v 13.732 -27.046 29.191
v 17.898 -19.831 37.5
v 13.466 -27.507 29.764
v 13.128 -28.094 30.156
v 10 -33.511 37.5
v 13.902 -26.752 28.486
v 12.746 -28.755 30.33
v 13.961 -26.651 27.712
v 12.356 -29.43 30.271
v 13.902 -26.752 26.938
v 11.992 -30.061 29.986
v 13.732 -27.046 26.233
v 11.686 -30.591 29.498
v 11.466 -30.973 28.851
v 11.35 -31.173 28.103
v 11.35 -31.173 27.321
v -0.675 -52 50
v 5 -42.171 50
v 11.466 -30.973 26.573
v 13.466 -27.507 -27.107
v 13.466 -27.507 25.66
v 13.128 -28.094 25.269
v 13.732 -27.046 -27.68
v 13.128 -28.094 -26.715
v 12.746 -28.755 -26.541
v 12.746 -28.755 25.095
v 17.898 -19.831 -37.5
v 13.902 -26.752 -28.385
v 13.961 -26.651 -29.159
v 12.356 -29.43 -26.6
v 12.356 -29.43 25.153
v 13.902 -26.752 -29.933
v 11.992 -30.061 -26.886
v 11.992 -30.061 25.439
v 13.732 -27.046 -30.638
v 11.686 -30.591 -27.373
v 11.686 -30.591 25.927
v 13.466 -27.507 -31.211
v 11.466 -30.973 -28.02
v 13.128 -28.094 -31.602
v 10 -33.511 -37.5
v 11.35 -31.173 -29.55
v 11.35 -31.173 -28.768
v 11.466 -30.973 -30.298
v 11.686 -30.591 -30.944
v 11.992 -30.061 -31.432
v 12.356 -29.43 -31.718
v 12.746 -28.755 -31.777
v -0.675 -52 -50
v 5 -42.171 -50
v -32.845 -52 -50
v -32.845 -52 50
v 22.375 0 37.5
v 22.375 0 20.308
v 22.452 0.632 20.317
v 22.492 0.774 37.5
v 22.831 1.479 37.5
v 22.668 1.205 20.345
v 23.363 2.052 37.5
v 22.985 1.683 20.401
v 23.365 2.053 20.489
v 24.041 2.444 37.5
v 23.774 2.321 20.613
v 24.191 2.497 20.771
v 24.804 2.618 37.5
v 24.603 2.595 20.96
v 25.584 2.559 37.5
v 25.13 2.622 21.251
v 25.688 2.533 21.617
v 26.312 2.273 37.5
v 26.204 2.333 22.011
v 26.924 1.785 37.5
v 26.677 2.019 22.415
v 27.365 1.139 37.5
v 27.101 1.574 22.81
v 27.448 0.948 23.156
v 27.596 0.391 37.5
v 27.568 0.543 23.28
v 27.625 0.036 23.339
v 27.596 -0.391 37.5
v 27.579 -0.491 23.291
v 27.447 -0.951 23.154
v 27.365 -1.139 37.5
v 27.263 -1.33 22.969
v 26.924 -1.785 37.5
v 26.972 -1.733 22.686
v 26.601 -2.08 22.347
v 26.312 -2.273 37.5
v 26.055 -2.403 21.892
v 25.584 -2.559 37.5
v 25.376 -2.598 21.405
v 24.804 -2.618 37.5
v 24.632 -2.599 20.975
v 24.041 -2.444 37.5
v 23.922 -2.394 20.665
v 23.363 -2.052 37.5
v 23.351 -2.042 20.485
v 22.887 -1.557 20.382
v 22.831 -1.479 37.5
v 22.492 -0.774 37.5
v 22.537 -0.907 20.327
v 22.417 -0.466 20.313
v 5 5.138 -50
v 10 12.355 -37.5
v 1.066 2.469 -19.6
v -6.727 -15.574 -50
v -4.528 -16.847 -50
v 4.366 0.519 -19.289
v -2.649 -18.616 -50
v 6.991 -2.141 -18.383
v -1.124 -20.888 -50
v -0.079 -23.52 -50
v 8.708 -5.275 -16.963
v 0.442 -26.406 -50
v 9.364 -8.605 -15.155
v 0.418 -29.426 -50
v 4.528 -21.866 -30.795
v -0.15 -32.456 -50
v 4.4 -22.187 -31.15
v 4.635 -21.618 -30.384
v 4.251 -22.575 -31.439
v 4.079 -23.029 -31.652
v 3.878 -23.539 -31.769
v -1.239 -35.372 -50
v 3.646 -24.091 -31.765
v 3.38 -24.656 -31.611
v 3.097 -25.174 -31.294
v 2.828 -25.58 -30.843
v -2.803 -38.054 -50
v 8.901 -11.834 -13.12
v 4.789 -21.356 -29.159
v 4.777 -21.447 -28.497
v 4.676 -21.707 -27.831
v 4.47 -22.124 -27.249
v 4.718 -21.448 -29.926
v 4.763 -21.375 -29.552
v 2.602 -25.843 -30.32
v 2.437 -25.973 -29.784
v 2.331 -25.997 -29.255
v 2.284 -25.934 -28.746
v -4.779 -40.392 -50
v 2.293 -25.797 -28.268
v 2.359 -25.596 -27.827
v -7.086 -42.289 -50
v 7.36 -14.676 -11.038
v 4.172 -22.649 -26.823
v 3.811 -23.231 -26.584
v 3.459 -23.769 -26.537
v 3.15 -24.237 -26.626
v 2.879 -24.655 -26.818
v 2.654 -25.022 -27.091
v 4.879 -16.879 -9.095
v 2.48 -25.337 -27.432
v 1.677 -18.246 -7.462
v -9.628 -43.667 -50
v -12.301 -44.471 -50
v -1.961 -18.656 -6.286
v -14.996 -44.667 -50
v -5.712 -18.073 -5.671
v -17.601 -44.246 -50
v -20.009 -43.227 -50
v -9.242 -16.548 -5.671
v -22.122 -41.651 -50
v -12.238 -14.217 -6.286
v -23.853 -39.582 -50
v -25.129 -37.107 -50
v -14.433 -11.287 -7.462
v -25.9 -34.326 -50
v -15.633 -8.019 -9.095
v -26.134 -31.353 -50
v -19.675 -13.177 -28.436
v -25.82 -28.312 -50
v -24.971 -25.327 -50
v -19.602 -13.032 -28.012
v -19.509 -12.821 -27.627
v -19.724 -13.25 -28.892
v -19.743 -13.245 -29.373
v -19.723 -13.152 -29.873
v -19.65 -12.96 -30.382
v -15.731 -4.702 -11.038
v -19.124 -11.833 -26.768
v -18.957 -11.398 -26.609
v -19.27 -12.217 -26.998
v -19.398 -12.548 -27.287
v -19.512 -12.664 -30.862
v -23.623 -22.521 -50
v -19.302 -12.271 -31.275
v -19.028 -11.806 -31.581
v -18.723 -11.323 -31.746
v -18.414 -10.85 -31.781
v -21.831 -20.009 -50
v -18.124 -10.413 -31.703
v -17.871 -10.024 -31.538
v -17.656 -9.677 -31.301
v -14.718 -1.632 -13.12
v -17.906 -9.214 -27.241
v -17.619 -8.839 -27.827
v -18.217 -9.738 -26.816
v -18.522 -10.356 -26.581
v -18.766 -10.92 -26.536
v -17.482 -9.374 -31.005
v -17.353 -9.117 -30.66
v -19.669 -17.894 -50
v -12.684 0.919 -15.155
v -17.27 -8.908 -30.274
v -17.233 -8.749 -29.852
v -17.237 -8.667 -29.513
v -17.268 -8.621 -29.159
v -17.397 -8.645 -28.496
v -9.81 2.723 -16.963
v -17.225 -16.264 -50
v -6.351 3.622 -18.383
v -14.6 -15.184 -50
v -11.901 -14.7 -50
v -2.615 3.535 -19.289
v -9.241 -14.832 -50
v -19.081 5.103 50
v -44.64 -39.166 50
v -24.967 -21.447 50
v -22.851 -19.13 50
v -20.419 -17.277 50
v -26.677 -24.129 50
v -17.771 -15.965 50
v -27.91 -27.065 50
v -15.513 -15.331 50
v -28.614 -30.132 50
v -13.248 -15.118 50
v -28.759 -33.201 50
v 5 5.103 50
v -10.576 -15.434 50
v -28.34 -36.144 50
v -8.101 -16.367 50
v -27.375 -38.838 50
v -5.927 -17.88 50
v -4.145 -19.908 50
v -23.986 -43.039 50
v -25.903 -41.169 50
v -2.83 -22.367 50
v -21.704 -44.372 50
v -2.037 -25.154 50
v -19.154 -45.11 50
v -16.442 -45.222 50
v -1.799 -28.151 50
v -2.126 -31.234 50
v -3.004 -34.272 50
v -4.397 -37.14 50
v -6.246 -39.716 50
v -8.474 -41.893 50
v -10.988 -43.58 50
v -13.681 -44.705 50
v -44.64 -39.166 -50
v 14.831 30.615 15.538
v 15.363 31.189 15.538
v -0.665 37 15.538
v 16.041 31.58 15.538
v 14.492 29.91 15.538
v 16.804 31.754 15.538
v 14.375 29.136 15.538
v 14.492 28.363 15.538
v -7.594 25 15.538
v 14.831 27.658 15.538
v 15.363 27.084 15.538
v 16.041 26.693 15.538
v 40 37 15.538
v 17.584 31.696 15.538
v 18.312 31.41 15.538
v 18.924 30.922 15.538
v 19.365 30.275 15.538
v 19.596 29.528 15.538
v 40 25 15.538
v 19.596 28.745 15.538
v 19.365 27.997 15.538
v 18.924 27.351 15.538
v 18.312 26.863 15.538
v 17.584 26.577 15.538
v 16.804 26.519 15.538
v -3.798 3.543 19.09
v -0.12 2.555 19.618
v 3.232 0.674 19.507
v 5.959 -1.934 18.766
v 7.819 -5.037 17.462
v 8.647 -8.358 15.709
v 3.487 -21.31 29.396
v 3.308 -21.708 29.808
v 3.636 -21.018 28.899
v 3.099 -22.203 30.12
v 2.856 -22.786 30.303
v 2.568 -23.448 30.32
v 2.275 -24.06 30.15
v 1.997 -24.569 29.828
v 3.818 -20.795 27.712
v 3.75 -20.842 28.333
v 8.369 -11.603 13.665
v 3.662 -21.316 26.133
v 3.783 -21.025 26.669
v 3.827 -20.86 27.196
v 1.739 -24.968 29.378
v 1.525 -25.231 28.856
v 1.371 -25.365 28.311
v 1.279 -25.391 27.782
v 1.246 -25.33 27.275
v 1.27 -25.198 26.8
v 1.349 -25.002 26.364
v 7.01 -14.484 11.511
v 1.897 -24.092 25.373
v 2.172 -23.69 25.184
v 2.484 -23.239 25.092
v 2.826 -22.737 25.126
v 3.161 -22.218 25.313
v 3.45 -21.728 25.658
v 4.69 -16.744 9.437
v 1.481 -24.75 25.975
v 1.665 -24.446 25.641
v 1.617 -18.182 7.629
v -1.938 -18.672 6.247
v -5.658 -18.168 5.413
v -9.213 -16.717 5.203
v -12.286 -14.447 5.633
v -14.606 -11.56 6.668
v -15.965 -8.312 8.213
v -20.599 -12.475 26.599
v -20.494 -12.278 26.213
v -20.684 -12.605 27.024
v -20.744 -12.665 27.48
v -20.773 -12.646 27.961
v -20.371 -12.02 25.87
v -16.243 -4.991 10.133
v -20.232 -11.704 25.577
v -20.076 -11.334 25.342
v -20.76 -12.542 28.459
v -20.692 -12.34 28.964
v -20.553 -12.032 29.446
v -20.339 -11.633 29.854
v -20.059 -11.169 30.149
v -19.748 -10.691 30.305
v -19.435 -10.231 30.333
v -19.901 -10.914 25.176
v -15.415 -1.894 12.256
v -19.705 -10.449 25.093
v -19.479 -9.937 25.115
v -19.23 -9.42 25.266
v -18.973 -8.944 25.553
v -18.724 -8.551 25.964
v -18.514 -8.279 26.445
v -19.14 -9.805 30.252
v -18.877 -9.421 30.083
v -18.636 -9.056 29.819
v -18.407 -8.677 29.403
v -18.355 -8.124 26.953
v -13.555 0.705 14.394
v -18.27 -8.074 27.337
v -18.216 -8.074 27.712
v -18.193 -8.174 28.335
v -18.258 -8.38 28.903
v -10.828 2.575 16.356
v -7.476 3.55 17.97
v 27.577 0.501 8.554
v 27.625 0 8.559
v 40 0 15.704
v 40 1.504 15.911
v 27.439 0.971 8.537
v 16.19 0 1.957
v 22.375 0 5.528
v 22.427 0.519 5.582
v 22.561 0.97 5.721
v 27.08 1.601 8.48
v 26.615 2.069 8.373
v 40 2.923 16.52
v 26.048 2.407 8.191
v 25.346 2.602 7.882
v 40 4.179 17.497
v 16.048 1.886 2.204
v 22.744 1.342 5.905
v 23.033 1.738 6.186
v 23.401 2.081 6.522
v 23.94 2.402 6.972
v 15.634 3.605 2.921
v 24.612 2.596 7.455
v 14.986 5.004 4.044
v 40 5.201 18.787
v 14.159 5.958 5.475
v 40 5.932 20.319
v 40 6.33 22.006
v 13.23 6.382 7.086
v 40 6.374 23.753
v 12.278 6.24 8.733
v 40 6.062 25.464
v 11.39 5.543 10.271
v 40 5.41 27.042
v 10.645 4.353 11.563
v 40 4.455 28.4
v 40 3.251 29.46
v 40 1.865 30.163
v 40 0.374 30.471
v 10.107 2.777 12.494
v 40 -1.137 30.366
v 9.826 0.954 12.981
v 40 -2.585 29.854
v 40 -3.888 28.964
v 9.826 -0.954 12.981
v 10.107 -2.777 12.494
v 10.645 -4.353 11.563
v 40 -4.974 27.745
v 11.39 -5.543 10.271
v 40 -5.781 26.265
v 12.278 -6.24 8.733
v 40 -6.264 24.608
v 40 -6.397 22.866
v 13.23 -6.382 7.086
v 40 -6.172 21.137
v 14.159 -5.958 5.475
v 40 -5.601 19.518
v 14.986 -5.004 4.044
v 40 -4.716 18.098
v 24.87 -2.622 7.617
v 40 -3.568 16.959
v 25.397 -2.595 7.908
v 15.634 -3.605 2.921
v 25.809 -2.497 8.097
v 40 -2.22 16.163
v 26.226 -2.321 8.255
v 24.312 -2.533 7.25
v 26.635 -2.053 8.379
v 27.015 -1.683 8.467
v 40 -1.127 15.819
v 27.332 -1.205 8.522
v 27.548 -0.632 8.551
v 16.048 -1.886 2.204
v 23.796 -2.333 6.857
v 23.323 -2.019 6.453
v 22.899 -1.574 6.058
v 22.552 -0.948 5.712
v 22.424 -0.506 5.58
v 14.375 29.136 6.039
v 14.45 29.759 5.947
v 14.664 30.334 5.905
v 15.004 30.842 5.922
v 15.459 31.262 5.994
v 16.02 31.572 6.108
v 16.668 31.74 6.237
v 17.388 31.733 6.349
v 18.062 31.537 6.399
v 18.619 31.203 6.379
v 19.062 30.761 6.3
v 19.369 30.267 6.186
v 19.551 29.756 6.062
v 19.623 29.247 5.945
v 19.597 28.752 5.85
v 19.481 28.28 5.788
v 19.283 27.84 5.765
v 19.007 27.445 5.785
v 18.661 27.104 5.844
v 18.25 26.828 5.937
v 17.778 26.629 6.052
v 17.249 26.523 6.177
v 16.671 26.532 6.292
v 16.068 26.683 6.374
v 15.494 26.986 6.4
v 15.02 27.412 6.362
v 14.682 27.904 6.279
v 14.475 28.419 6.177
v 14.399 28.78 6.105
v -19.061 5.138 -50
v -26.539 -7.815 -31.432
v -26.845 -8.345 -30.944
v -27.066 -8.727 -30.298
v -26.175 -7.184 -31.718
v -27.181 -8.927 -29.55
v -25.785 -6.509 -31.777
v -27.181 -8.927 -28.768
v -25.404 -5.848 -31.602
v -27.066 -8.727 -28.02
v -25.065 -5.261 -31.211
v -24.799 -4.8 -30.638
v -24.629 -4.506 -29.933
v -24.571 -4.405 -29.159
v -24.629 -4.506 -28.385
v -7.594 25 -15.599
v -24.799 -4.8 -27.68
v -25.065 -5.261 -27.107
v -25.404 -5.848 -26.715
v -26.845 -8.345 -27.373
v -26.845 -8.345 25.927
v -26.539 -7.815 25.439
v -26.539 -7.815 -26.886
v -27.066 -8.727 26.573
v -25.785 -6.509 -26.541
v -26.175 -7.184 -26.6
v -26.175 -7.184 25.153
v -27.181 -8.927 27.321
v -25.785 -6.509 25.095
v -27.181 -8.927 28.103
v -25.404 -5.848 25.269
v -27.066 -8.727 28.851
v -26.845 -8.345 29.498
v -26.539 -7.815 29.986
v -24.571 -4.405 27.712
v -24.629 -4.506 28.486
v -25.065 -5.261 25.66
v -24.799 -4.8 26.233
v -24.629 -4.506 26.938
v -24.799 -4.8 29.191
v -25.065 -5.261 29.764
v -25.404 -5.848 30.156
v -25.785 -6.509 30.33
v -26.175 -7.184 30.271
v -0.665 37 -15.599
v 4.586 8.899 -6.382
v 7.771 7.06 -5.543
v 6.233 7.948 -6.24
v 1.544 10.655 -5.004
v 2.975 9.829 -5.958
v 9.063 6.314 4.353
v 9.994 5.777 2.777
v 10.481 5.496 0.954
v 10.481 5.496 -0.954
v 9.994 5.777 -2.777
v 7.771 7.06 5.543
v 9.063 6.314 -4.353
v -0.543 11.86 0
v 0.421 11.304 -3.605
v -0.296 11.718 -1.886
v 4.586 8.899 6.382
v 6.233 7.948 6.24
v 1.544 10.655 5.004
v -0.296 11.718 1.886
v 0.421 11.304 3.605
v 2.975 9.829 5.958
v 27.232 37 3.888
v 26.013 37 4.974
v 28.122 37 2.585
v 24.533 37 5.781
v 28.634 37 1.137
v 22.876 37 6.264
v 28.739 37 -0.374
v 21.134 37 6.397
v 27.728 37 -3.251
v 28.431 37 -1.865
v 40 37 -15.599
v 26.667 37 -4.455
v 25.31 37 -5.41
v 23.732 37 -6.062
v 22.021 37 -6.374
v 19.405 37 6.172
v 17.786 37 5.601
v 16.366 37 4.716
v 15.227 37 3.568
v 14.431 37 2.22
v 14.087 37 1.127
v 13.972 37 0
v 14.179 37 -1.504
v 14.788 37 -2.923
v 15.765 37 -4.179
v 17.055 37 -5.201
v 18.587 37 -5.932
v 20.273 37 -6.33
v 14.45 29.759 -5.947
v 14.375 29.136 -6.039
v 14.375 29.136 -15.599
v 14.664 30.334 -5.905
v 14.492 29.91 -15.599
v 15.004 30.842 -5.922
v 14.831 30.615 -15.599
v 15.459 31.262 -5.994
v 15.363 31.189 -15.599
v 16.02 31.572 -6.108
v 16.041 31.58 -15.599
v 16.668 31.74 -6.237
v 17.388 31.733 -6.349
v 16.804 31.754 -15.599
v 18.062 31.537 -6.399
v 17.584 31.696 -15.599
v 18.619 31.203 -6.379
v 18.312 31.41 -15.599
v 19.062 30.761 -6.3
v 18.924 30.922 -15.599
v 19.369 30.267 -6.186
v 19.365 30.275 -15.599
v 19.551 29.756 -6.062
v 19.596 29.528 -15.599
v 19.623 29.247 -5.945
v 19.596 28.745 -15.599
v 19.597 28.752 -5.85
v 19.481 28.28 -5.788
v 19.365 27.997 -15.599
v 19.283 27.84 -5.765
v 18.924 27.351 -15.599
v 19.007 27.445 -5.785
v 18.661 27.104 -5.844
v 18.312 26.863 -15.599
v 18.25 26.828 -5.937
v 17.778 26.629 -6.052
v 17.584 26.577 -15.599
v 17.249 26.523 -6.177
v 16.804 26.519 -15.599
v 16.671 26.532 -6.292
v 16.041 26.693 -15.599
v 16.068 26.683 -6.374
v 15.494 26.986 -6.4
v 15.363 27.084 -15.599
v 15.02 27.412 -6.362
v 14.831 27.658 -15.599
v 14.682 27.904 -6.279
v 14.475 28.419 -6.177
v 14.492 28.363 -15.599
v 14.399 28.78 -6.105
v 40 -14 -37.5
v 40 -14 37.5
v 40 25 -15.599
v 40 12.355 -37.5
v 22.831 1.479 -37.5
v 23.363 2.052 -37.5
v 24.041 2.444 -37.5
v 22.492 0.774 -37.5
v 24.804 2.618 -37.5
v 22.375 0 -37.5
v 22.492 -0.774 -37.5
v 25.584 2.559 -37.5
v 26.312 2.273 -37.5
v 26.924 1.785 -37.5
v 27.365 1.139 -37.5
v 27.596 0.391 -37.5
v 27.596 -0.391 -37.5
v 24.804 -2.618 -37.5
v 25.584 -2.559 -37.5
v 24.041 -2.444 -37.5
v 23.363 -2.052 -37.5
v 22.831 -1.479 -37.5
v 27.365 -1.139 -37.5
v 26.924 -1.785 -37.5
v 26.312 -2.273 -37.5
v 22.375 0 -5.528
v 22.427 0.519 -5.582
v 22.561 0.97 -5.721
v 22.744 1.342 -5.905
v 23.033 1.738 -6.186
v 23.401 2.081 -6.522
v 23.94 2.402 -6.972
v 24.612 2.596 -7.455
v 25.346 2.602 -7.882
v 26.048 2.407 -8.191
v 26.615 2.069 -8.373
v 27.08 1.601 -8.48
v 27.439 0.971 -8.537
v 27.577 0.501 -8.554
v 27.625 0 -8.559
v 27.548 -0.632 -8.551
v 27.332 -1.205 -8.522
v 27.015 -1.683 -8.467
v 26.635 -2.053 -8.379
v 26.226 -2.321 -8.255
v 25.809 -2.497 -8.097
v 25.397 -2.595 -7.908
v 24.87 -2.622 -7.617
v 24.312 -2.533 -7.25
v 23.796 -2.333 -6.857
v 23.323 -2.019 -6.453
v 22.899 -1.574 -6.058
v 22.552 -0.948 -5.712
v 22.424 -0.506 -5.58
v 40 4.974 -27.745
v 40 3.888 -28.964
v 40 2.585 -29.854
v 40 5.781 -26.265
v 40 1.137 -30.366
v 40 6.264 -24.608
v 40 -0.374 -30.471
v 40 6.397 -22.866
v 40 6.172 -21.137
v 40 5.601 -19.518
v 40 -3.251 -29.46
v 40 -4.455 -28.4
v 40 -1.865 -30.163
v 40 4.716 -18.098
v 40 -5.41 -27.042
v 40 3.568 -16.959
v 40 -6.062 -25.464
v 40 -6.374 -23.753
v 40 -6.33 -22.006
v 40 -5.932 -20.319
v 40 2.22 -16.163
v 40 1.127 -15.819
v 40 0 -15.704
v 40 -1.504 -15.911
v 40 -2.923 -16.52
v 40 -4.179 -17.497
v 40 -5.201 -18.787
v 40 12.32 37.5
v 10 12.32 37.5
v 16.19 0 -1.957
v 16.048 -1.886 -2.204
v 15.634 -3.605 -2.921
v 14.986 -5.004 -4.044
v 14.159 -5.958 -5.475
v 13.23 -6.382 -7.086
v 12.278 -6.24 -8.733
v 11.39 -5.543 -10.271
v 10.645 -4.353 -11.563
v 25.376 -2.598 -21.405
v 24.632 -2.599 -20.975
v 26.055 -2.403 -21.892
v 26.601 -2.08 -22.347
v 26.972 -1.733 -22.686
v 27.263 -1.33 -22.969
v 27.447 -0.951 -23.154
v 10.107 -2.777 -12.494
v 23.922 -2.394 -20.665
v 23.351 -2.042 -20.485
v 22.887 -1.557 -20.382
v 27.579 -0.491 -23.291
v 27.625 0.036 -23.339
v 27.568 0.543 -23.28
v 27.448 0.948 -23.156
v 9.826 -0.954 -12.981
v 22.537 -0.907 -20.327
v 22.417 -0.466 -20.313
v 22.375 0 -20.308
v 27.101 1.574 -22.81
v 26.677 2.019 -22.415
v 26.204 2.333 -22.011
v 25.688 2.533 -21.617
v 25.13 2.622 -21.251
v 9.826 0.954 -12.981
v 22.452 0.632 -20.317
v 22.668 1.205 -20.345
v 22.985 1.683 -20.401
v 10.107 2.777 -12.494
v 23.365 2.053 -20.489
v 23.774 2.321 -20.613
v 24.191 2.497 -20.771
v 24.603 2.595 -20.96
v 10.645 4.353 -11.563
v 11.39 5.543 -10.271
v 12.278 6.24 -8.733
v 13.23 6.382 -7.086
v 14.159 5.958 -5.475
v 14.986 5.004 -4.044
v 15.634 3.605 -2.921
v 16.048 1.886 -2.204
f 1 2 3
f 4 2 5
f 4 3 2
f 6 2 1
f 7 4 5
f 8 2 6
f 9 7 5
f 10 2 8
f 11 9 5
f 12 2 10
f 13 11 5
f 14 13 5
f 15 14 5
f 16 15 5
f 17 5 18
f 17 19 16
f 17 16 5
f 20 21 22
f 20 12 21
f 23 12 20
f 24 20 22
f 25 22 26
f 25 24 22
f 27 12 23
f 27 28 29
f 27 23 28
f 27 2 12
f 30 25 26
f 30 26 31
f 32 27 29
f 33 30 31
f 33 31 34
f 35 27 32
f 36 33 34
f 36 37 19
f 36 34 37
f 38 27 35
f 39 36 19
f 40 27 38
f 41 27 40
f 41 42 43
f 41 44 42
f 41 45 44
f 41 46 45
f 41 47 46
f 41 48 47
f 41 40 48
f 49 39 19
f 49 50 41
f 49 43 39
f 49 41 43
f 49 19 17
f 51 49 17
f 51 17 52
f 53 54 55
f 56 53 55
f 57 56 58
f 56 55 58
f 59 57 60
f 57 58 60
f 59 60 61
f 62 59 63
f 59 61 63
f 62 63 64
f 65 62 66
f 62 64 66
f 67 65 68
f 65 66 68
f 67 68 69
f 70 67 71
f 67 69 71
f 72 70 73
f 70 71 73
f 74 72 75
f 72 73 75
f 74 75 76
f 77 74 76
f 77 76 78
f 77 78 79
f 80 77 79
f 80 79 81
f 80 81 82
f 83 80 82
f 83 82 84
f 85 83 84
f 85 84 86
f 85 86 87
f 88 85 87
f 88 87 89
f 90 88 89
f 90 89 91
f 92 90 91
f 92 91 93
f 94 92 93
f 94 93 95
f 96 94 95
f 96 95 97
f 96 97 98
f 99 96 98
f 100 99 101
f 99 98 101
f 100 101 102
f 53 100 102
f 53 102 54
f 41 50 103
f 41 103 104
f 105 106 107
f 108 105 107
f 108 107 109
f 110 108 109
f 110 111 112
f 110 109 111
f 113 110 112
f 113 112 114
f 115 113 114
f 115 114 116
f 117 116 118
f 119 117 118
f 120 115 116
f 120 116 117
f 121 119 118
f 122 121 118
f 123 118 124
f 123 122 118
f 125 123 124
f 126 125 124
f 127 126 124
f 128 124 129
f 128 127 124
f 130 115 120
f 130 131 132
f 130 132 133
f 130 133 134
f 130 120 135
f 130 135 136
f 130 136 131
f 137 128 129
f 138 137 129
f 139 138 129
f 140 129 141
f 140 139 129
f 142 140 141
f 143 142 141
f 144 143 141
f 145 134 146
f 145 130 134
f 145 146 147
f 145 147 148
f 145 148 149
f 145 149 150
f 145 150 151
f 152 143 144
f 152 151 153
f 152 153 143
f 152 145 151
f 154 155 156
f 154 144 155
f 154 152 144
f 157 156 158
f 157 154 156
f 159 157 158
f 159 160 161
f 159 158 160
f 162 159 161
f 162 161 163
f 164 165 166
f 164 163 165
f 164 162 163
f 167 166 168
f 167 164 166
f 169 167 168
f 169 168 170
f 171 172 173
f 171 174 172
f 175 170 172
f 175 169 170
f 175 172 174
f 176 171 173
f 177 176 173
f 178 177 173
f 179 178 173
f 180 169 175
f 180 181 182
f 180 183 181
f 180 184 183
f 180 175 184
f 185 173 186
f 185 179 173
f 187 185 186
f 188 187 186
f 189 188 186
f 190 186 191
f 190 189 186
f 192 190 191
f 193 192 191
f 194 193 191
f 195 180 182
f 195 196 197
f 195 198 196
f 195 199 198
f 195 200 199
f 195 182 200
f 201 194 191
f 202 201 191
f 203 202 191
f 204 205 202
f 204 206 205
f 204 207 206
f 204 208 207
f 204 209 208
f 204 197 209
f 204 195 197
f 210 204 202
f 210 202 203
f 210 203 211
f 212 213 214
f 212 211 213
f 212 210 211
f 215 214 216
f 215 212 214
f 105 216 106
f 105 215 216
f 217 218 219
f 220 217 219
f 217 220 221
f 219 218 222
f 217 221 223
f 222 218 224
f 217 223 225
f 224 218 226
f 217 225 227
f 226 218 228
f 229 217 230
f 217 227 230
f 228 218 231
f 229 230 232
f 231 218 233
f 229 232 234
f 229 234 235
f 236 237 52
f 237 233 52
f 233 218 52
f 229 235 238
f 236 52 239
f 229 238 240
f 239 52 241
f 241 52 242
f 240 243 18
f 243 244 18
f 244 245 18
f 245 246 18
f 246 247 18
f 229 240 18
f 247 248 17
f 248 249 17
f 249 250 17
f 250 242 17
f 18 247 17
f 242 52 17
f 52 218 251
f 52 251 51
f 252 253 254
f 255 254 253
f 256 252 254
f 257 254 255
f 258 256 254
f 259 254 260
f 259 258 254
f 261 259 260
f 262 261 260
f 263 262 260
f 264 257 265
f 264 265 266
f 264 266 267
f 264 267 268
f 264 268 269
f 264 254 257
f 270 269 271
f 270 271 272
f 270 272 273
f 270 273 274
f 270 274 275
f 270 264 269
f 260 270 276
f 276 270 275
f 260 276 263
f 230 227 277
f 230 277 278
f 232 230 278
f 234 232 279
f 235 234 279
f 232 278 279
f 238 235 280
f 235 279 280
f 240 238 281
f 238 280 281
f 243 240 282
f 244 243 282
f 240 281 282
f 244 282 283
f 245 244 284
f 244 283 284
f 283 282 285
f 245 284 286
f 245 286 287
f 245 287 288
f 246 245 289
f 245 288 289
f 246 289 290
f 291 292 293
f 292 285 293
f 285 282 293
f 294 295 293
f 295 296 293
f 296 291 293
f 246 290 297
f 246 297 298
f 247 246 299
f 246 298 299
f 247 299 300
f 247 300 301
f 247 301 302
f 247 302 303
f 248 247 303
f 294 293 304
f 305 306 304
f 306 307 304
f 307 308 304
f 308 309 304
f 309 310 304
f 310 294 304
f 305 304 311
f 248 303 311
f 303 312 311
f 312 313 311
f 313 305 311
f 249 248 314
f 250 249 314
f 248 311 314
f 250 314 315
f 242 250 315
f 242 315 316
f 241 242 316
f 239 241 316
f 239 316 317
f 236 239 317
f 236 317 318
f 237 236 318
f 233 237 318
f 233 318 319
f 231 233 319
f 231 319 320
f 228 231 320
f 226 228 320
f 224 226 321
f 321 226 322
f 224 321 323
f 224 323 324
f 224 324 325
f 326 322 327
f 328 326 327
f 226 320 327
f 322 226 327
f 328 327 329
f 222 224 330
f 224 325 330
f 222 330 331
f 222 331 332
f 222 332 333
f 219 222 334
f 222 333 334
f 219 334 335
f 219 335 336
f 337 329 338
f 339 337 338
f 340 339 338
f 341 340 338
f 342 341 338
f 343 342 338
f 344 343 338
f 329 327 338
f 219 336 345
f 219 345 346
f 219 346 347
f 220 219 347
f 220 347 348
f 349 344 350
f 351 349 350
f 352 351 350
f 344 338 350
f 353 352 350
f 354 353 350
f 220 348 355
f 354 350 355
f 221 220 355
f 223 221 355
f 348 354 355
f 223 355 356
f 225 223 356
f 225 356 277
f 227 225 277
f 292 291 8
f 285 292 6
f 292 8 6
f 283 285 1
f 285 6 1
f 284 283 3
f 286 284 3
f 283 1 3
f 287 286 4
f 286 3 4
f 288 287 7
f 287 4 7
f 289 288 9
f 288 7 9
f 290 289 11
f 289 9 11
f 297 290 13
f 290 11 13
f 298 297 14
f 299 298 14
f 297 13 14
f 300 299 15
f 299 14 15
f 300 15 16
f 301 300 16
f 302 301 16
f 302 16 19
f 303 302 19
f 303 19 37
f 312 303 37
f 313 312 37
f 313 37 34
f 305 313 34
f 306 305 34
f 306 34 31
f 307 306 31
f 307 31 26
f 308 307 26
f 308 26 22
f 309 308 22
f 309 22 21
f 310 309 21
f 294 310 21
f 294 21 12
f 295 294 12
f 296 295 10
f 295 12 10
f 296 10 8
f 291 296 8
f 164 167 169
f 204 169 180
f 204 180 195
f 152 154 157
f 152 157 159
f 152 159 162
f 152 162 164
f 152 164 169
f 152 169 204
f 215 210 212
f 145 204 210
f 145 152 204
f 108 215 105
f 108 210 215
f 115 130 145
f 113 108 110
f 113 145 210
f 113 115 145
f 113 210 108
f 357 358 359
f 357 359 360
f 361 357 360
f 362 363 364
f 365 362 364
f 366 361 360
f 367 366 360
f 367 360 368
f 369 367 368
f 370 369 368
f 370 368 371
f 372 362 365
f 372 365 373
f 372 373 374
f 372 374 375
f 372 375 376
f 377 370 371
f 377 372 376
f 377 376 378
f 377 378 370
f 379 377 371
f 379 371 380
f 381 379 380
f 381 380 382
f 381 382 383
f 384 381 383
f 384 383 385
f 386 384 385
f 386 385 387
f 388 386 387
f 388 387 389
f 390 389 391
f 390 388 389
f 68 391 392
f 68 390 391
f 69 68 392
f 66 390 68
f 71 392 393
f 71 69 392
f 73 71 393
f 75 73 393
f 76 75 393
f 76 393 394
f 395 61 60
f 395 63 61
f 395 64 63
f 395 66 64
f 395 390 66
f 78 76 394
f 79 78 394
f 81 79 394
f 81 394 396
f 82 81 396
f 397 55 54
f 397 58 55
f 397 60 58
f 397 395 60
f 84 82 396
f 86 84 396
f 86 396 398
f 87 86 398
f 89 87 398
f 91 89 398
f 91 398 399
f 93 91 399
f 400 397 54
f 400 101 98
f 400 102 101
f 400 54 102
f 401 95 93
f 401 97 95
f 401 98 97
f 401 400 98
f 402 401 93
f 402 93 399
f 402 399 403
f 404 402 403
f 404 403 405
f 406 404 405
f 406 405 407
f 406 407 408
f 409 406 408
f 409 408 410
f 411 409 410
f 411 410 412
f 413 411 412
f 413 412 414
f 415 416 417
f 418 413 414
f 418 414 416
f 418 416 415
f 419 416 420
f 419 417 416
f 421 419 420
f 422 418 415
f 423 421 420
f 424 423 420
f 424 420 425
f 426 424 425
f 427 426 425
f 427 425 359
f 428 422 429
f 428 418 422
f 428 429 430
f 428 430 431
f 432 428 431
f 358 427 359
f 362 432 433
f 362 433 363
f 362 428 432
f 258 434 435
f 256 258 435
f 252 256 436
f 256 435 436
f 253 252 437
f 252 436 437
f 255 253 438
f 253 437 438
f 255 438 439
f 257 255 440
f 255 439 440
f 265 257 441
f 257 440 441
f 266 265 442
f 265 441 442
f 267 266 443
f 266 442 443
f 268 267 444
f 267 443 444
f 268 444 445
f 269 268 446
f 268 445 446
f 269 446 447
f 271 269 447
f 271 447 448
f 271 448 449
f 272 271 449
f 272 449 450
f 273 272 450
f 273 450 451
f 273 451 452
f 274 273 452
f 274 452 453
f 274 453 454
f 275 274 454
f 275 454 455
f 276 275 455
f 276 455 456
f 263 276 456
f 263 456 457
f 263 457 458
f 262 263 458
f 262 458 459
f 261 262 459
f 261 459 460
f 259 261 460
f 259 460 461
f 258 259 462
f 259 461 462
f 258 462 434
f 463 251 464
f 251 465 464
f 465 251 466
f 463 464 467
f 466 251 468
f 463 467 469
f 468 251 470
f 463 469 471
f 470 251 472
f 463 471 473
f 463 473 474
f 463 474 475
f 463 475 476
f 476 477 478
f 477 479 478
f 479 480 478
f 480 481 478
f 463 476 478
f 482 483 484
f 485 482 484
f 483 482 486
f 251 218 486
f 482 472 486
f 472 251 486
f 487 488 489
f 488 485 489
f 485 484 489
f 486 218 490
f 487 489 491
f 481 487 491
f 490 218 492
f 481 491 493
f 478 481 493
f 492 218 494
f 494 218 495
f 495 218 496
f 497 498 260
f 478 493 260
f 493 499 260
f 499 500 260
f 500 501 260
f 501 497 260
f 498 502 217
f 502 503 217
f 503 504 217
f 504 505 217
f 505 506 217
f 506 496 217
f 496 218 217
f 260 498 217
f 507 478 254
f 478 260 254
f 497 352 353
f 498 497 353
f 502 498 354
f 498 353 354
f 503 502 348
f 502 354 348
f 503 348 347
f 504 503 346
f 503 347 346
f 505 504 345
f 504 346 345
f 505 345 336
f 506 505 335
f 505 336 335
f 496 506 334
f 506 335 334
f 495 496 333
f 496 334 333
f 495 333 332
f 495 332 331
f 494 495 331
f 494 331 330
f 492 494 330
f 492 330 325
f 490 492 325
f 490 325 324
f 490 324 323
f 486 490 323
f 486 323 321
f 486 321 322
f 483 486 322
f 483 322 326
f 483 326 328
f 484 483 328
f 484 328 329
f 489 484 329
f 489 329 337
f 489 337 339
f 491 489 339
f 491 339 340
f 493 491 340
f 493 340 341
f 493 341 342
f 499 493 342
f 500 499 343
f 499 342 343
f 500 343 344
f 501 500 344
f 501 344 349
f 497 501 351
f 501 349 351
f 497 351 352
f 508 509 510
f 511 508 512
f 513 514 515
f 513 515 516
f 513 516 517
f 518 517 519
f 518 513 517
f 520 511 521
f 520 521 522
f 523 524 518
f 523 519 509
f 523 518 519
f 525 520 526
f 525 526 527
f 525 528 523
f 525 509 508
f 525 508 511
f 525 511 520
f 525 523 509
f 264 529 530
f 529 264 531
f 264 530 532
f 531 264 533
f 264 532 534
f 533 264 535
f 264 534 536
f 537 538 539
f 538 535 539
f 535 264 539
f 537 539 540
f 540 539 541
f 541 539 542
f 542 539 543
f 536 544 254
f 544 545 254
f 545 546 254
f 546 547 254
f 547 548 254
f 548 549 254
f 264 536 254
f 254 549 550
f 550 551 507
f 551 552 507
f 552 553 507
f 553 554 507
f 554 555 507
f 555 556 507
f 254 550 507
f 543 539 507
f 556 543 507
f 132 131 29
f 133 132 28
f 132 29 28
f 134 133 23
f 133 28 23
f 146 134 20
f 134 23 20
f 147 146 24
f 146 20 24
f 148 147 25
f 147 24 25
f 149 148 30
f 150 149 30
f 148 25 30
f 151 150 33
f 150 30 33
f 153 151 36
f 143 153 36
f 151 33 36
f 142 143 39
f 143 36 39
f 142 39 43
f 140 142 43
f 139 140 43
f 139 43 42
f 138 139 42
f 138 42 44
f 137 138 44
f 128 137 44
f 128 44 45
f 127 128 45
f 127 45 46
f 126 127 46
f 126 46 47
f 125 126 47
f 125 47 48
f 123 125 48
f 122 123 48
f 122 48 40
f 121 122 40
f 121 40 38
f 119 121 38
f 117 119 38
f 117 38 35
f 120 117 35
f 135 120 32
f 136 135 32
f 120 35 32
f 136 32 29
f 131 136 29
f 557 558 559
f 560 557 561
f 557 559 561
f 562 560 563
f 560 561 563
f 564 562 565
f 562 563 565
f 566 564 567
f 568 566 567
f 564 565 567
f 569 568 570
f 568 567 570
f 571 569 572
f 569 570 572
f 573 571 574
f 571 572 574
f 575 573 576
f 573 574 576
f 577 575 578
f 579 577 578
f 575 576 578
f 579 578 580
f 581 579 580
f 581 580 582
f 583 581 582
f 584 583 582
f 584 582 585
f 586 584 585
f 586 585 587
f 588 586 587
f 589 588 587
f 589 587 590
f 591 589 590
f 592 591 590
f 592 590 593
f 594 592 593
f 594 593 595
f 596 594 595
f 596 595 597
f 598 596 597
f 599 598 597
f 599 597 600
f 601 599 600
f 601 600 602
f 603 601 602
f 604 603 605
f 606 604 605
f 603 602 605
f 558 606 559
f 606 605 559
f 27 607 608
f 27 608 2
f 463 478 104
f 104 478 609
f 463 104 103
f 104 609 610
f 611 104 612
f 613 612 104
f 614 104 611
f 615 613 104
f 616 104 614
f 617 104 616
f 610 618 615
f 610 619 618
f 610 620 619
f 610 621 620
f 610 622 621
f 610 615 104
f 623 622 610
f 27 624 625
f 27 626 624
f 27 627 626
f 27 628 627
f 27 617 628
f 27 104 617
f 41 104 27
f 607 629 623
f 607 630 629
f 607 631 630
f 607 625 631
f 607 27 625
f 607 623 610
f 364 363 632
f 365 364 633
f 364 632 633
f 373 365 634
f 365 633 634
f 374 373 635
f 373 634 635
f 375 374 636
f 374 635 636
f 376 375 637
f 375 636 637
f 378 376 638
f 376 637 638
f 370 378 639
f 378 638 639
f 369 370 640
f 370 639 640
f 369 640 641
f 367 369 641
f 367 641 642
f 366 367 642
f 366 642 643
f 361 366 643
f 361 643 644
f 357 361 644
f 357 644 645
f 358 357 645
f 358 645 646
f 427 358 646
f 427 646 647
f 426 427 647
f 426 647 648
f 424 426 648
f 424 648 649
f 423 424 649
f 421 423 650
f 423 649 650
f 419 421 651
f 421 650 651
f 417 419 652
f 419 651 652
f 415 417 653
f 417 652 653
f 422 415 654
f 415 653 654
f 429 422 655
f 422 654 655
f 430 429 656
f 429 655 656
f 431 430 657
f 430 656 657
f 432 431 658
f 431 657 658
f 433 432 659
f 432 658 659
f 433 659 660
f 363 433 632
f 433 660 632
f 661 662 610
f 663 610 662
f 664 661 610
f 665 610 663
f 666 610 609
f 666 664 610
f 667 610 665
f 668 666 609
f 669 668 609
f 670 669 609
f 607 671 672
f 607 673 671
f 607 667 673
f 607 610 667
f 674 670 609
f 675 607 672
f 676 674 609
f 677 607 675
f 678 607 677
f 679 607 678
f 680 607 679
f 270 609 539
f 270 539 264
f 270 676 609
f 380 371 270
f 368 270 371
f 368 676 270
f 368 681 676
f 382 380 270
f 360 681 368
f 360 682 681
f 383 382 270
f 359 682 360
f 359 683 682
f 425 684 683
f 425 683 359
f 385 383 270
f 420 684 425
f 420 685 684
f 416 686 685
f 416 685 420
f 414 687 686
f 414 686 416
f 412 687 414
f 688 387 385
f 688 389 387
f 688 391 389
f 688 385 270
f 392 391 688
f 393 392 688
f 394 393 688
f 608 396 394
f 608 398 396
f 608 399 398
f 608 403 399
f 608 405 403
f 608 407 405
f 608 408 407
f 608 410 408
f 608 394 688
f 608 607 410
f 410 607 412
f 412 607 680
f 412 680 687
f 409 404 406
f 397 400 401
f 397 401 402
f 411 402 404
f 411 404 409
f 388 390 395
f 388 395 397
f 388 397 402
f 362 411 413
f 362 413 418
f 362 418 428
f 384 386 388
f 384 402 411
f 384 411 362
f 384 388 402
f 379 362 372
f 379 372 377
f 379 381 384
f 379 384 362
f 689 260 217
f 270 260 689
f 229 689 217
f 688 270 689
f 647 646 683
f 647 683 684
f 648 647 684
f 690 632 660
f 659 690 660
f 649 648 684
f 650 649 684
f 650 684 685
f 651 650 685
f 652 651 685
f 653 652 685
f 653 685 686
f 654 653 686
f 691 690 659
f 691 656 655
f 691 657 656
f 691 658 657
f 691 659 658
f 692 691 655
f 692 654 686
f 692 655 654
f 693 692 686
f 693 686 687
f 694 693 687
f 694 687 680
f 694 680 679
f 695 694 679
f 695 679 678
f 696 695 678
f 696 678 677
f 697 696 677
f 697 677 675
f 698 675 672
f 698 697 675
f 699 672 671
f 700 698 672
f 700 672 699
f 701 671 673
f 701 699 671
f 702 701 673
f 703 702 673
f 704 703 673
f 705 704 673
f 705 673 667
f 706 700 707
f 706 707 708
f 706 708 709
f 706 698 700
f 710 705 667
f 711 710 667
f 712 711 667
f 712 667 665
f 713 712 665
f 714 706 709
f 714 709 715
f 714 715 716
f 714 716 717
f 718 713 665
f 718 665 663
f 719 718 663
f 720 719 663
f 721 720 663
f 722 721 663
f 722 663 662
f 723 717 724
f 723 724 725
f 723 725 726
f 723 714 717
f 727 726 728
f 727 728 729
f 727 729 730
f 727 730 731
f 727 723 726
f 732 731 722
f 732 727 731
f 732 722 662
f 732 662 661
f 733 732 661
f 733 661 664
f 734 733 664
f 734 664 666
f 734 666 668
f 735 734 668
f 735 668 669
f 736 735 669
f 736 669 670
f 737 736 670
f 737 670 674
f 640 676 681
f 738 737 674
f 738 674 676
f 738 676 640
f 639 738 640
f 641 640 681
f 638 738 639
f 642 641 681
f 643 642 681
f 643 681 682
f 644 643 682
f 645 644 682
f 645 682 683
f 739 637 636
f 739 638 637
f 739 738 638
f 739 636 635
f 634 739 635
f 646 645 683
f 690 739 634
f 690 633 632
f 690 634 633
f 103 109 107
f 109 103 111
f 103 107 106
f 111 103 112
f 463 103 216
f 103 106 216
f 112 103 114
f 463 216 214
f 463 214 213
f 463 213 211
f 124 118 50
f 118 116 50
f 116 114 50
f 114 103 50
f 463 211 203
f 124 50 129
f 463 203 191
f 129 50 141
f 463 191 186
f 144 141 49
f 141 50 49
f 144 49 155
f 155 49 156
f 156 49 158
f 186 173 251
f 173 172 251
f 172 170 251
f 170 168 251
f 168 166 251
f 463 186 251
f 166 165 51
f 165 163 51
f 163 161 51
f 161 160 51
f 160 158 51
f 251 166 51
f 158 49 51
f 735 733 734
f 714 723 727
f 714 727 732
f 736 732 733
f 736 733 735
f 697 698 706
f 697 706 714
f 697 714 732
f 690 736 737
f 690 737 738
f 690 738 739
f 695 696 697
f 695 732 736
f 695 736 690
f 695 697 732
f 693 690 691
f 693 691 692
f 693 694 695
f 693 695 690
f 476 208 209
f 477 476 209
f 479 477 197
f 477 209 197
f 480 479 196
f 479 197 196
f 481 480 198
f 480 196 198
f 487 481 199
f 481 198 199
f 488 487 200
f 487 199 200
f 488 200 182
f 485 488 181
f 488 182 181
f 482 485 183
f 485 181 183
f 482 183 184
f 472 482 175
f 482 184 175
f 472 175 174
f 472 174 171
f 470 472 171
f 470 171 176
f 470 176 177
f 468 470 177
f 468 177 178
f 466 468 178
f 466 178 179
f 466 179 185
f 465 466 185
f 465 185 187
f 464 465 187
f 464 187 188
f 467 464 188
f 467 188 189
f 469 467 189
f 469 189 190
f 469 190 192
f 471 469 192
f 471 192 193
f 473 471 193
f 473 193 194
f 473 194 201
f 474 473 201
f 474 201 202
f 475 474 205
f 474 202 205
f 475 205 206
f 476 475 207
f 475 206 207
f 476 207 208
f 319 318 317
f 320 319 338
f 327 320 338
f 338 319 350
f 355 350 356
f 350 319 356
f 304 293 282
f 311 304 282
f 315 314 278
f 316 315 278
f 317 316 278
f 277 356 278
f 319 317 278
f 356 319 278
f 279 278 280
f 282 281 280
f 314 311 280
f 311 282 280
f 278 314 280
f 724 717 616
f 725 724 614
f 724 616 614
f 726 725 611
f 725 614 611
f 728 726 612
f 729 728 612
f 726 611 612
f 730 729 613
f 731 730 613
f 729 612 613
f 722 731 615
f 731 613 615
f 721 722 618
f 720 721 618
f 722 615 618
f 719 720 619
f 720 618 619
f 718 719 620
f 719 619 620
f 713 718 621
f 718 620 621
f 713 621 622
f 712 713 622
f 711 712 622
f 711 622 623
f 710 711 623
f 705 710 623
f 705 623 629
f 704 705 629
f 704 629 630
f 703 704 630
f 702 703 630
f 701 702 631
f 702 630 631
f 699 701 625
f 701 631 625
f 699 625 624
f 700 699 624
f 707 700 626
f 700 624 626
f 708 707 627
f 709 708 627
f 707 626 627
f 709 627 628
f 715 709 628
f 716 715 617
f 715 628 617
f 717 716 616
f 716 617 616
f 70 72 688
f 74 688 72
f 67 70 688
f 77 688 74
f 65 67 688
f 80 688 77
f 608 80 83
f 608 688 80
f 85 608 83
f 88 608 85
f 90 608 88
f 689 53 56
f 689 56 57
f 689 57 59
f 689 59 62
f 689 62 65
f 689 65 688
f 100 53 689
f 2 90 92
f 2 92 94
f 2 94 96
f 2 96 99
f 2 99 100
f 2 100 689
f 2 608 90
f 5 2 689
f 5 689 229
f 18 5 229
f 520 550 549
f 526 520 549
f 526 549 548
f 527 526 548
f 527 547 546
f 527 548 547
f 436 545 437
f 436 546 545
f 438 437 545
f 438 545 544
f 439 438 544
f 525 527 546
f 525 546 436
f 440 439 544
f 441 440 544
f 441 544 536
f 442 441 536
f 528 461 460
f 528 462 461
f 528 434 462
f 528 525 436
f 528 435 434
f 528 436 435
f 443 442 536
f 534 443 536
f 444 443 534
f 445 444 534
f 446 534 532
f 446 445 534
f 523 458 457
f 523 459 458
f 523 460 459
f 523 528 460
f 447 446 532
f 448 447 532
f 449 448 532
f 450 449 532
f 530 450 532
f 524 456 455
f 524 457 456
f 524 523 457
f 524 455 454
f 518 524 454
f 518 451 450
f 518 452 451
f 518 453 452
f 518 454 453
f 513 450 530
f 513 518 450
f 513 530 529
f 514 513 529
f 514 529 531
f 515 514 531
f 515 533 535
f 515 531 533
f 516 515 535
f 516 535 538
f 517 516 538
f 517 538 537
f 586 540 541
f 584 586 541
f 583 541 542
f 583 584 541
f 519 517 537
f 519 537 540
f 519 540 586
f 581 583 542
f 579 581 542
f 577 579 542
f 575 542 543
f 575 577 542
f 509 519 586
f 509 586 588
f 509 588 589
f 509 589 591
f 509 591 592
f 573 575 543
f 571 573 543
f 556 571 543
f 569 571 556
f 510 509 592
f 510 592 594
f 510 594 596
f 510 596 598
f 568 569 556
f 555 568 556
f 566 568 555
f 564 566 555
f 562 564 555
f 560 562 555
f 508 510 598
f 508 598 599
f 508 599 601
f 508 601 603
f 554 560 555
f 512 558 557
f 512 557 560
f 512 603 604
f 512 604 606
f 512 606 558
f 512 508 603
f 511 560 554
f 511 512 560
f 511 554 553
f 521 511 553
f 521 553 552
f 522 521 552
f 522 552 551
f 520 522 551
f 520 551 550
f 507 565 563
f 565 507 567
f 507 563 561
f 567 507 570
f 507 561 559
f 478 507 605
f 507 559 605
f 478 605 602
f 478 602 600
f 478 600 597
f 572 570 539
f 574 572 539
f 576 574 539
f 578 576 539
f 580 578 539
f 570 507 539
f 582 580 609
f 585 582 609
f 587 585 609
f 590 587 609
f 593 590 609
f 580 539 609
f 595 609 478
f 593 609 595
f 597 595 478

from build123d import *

# Parameters (mm, degrees)
BOSS_EXTRUDE1_DEPTH      = 37
BOSS_EXTRUDE1_DEPTH_BACK = 52
CUT_EXTRUDE5_REACH       = 108.479
SKETCH11_R               = 6.4
SKETCH12_R               = 6.4
CUT_EXTRUDE6_DEPTH       = 107.479320653
SKETCH14_R               = 12.9
CUT_EXTRUDE8_DEPTH       = 96.517571793
SKETCH15_R               = 12.9
CUT_EXTRUDE9_DEPTH       = 96.055320399
SKETCH16_R               = 2.625
CUT_EXTRUDE10_DEPTH      = 128.687117596
SKETCH13_R               = 6.4
CUT_EXTRUDE15_DEPTH      = 103.003266712
CUT_EXTRUDE16_DEPTH      = 128.687117596
CUT_EXTRUDE17_DEPTH      = 125.149710579
CUT_EXTRUDE25_DEPTH      = 117.949180331
SKETCH31_R               = 2.625
CUT_EXTRUDE22_DEPTH      = 103.253619099
CUT_EXTRUDE26_DEPTH      = 125.149710659
SKETCH36_R               = 2.625
CUT_EXTRUDE27_DEPTH      = 95.867859136


with BuildPart() as part:
    # Sketch9 → Boss-Extrude1 (new, two sides: drawn at the far end of the back side and taken through both)
    with BuildSketch(Plane(origin=(0, 0, 0), x_dir=(1, 0, 0), z_dir=(0, 1, 0)).offset(-BOSS_EXTRUDE1_DEPTH_BACK)):
        Polygon((-5, 50), (5, 50), (10, 37.5), (40, 37.5), (40, -37.5), (10, -37.5), (5, -50), (-5, -50), (-60, -50), (-60, 50), align=None)
    extrude(amount=BOSS_EXTRUDE1_DEPTH + BOSS_EXTRUDE1_DEPTH_BACK)

    # Cut-Extrude5: up to this plane
    cut_extrude5_end = Plane(origin=(40, -52, 37.5), z_dir=(1, 0, 0))
    # Sketch11 → Cut-Extrude5 (cut, up to the surface)
    with BuildSketch(Plane(origin=(12.990381057, 0, -7.5), x_dir=(-0.5000000000000013, 0, -0.8660254037844379), z_dir=(0.8660254037844379, 0, -0.5000000000000013)), mode=Mode.PRIVATE) as cut_extrude5_sk1:
        with Locations(Location((0, 0, 0), (0, 0, 180))):
            Circle(SKETCH11_R)
    cut_extrude5_tool1 = split(extrude(cut_extrude5_sk1.sketch, amount=CUT_EXTRUDE5_REACH, mode=Mode.PRIVATE), bisect_by=cut_extrude5_end, keep=Keep.BOTH, mode=Mode.PRIVATE)
    add(cut_extrude5_tool1.solids().sort_by_distance((12.990381, 0, -7.5))[0], mode=Mode.SUBTRACT)

    # Sketch12 → Cut-Extrude6 (cut, through all)
    with BuildSketch(Plane(origin=(12.990381057, 0, 7.5), x_dir=(0.5000000000000009, 0, -0.866025403784438), z_dir=(0.8660254037844382, 0, 0.500000000000001))):
        Circle(SKETCH12_R)
    extrude(amount=CUT_EXTRUDE6_DEPTH, mode=Mode.SUBTRACT)

    # Sketch14 → Cut-Extrude8 (cut, through all)
    with BuildSketch(Plane(origin=(-3.229283171, -7.476383099, -12.59664344), x_dir=(-0.9697475532809772, 0.007782671596180618, 0.24398588674016475), z_dir=(-0.21528554474375752, -0.49842553993010197, -0.8397762293431328))):
        with Locations(Location((0, 0, 0), (0, 0, 116.704243504))):
            Circle(SKETCH14_R)
    extrude(amount=CUT_EXTRUDE8_DEPTH, mode=Mode.SUBTRACT)

    # Sketch15 → Cut-Extrude9 (cut, through all)
    with BuildSketch(Plane(origin=(-3.798019855, -7.5, 12.422763186), x_dir=(-0.9674136083951571, 0.13086508264944213, -0.2167607908156276), z_dir=(0.2532013236376571, 0.49999999999999495, -0.8281842124238686))):
        with Locations(Location((0, 0, 0), (0, 0, 90))):
            Circle(SKETCH15_R)
    extrude(amount=-CUT_EXTRUDE9_DEPTH, mode=Mode.SUBTRACT)

    # Sketch16 → Cut-Extrude10 (cut, through all)
    with BuildSketch(Plane(origin=(0, 0, -50), x_dir=(-1, 0, 0), z_dir=(0, 0, -1))):
        with Locations((-25, 0)):
            Circle(SKETCH16_R)
    extrude(amount=-CUT_EXTRUDE10_DEPTH, mode=Mode.SUBTRACT)

    # Sketch13 → Cut-Extrude15 (cut, through all)
    with BuildSketch(Plane(origin=(5, 8.660254038, 0), x_dir=(0.8581606322585569, -0.49545927204241474, -0.1344635228929922), z_dir=(0.49999999999999806, 0.8660254037844397, 0))):
        with Locations(Location((0, 0, 0), (0, 0, 172.272400829))):
            Circle(SKETCH13_R)
    extrude(amount=CUT_EXTRUDE15_DEPTH, mode=Mode.SUBTRACT)

    # Sketch25 → Cut-Extrude16 (cut, through all)
    with BuildSketch(Plane.XY.offset(50)):
        Polygon((-60, -65.770666842), (-0.665327834, 37), (-60, 37), align=None)
    extrude(amount=-CUT_EXTRUDE16_DEPTH, mode=Mode.SUBTRACT)

    # Sketch26 → Cut-Extrude17 (cut, through all)
    with BuildSketch(Plane(origin=(0, 0, -50), x_dir=(-1, 0, 0), z_dir=(0, 0, -1))):
        Polygon((-40, -14), (-17.898055975, -19.831365478), (0.674513826, -52), (-40, -52), align=None)
    extrude(amount=-CUT_EXTRUDE17_DEPTH, mode=Mode.SUBTRACT)

    # Sketch27 → Cut-Extrude25 (cut, through all)
    with BuildSketch(Plane.ZY.offset(-40)):
        Polygon((-50, 37), (-15.598651273, 37), (-15.598651273, 25), (-50, 5.138372052), align=None)
        Polygon((15.537544719, 37), (15.537544719, 25), (50, 5.103092167), (50, 37), align=None)
    extrude(amount=CUT_EXTRUDE25_DEPTH, mode=Mode.SUBTRACT)

    # Sketch31 → Cut-Extrude22 (cut, through all)
    with BuildSketch(Plane(origin=(22.010775129, -12.707926946, 0), x_dir=(0, 0, -1), z_dir=(0.8660254037844397, -0.4999999999999981, 0))):
        with Locations(Location((-27.712190923, -18.725438309, 0), (0, 0, 90))):
            Circle(SKETCH31_R)
        with Locations(Location((29.158933157, -18.725438309, 0), (0, 0, 90))):
            Circle(SKETCH31_R)
    extrude(amount=-CUT_EXTRUDE22_DEPTH, mode=Mode.SUBTRACT)

    # Sketch35 → Cut-Extrude26 (cut, through all)
    with BuildSketch(Plane(origin=(0, 0, -50), x_dir=(-1, 0, 0), z_dir=(0, 0, -1))):
        Polygon((44.639977993, -39.16632832), (25.461488573, -60.033808877), (52.049501792, -52), align=None)
    extrude(amount=-CUT_EXTRUDE26_DEPTH, mode=Mode.SUBTRACT)

    # Sketch36 → Cut-Extrude27 (cut, through all)
    with BuildSketch(Plane(origin=(0, 0, -15.598651273), x_dir=(-1, 0, 0), z_dir=(0, 0, -1))):
        with Locations((-17, 29.136428333)):
            Circle(SKETCH36_R)
    extrude(amount=-CUT_EXTRUDE27_DEPTH, mode=Mode.SUBTRACT)


solid = part.part
